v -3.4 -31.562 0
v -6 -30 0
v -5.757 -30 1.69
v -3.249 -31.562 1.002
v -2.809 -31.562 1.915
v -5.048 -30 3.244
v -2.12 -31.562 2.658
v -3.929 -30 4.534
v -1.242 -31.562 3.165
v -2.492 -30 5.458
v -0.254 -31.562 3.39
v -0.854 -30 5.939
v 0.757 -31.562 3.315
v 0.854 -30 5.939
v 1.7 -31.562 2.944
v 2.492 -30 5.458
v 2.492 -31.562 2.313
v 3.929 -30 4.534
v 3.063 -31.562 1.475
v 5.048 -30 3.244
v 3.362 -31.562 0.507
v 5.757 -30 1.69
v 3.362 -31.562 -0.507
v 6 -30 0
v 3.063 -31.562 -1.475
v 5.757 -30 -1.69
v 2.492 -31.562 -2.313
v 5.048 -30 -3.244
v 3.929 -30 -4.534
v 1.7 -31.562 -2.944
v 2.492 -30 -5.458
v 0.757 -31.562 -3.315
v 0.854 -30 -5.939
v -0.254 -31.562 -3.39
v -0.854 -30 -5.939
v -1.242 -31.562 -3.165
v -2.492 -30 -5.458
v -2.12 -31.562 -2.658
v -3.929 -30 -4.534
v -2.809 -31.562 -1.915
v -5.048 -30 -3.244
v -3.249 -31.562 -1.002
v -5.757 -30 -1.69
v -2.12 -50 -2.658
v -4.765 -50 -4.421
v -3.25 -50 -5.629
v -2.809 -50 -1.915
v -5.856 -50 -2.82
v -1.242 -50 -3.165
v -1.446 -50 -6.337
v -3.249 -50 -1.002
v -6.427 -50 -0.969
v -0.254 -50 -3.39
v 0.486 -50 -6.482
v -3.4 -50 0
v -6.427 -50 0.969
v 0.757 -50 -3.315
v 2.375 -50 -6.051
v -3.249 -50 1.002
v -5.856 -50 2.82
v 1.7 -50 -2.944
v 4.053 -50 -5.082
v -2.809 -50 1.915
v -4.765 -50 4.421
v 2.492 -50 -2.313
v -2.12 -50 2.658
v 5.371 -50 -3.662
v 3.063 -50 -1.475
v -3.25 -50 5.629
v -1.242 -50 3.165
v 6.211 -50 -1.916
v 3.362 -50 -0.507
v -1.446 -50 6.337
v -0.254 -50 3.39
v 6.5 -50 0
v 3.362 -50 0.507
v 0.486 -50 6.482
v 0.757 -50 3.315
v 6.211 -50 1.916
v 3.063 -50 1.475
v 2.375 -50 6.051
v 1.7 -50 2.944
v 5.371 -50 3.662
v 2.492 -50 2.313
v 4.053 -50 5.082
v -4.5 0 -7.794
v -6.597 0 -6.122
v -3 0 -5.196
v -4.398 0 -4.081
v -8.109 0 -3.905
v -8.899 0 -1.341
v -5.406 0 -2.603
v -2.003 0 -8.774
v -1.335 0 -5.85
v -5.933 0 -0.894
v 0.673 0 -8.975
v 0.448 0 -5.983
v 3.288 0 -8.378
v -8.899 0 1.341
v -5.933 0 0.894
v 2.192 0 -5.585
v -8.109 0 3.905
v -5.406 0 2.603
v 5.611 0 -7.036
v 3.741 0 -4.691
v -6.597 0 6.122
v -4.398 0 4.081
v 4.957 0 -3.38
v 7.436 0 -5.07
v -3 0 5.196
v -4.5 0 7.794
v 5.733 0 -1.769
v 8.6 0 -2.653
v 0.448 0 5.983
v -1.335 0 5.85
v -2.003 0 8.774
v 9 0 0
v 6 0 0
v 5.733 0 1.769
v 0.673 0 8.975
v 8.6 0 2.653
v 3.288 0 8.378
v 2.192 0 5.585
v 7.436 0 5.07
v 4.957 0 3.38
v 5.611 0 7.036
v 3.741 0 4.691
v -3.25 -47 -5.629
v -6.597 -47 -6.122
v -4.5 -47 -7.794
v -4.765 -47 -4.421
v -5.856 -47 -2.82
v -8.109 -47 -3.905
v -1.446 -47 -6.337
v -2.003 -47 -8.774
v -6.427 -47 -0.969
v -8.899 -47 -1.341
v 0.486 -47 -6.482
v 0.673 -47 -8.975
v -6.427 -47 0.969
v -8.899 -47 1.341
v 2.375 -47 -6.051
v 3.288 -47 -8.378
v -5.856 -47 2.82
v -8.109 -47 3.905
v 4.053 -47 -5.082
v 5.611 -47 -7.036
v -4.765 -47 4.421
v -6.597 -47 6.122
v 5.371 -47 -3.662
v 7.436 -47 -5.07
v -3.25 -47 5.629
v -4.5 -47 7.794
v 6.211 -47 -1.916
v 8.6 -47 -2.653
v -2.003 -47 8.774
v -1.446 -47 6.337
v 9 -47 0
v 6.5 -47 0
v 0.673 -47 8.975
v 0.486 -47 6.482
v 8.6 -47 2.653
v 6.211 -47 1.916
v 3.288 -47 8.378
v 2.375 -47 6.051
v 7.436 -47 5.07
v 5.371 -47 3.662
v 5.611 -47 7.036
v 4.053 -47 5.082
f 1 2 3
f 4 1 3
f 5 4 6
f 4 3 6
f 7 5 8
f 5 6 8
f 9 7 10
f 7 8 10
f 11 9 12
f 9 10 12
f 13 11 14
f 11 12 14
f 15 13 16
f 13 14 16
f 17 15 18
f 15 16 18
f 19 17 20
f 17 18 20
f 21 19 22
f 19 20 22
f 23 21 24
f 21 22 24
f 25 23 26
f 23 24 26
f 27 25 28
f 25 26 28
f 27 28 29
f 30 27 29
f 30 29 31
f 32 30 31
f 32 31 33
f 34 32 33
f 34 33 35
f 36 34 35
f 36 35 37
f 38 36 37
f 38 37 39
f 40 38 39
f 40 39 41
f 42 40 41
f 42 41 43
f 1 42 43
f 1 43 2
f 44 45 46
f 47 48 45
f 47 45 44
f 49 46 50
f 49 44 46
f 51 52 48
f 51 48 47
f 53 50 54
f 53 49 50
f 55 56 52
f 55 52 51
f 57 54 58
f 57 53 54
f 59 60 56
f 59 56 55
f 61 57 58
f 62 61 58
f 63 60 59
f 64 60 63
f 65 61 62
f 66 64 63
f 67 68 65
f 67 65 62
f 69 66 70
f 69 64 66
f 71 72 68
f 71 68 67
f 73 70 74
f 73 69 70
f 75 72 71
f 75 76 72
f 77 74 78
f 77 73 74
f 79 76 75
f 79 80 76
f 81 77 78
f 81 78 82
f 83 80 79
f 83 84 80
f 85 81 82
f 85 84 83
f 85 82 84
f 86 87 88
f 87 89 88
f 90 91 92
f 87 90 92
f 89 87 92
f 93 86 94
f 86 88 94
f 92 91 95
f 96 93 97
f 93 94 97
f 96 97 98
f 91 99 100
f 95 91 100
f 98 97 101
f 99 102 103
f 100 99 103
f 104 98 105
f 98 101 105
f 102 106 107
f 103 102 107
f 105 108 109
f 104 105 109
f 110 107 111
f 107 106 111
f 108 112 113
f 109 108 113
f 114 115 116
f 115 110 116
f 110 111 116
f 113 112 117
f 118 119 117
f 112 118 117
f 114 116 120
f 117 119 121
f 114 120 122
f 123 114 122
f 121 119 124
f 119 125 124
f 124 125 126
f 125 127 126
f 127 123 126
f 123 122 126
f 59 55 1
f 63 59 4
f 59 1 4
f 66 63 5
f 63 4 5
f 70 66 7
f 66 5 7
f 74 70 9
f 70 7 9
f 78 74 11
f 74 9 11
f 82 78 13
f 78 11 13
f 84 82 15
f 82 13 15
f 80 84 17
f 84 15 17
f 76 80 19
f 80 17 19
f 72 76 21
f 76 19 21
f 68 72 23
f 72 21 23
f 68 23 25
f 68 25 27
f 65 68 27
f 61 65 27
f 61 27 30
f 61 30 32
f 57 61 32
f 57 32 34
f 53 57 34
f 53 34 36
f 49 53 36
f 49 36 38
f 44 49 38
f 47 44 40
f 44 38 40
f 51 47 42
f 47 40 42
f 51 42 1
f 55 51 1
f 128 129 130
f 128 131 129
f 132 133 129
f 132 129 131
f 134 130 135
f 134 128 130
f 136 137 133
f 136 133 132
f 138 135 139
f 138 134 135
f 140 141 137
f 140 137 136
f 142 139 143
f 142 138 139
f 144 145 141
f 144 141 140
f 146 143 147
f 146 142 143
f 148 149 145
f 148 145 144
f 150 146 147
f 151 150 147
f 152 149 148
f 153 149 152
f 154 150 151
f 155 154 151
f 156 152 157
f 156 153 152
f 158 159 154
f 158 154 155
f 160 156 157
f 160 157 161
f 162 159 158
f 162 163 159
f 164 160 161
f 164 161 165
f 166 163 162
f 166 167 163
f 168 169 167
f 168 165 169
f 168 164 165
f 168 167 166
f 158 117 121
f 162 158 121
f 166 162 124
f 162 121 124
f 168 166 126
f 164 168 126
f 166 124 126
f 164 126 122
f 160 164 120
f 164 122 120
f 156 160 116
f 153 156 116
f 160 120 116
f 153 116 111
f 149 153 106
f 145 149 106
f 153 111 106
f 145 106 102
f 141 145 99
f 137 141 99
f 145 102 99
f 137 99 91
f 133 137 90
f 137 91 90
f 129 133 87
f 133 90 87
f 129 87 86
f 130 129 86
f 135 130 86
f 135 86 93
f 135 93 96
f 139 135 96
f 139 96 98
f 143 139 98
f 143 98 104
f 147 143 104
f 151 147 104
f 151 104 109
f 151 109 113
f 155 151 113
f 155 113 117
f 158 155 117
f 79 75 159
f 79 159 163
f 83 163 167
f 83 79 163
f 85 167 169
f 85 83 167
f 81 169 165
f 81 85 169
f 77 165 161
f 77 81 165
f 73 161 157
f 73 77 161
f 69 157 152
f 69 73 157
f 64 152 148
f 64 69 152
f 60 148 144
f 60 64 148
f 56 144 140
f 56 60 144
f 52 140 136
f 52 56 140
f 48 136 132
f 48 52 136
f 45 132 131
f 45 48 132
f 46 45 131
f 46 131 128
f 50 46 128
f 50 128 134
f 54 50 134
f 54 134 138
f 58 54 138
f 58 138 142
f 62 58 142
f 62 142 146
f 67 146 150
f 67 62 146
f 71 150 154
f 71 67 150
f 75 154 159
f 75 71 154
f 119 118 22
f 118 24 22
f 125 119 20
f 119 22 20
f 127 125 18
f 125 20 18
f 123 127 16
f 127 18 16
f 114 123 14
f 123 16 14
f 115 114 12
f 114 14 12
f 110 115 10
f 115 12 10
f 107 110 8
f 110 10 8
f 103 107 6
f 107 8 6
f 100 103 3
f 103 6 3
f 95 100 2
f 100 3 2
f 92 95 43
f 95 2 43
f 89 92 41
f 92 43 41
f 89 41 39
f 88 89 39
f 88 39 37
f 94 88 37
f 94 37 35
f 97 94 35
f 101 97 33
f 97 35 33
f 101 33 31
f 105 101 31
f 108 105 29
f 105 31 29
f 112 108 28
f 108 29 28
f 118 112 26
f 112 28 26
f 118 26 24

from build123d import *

# Parameters (mm, degrees)
F0_R     = 9
F1_DEPTH = 50
F2_R     = 9
F2_R_2   = 6.5
F3_DEPTH = 3
F5_D     = 6.8
F5_DEPTH = 20
F5_TIP   = 2.0429261047
F7_D     = 12
F7_DEPTH = 30
F7_TIP   = 3.6051637142


with BuildPart() as f1:
    # F0 (on Front) → F1 (new body)
    with BuildSketch(Plane.XZ):
        Circle(F0_R)
    extrude(amount=F1_DEPTH)

    # F2 (on face) → F3 (cut)
    with BuildSketch(Plane.XZ.offset(50)):
        Circle(F2_R)
        Circle(F2_R_2, mode=Mode.SUBTRACT)
    extrude(amount=-F3_DEPTH, mode=Mode.SUBTRACT)

    # F5
    with Locations(Plane.XZ.offset(50)):
        with Locations((0, 0)):
            Hole(F5_D / 2, depth=F5_DEPTH)
            with Locations((0, 0, -(F5_DEPTH + F5_TIP / 2))):  # 118° drill point
                Cone(0, F5_D / 2, F5_TIP, mode=Mode.SUBTRACT)

    # F7
    with Locations(Plane(origin=(0, 0, 0), x_dir=(-1, 0, 0), z_dir=(0, 1, 0))):
        with Locations((0, 0)):
            Hole(F7_D / 2, depth=F7_DEPTH)
            with Locations((0, 0, -(F7_DEPTH + F7_TIP / 2))):  # 118° drill point
                Cone(0, F7_D / 2, F7_TIP, mode=Mode.SUBTRACT)


solid = f1.part
